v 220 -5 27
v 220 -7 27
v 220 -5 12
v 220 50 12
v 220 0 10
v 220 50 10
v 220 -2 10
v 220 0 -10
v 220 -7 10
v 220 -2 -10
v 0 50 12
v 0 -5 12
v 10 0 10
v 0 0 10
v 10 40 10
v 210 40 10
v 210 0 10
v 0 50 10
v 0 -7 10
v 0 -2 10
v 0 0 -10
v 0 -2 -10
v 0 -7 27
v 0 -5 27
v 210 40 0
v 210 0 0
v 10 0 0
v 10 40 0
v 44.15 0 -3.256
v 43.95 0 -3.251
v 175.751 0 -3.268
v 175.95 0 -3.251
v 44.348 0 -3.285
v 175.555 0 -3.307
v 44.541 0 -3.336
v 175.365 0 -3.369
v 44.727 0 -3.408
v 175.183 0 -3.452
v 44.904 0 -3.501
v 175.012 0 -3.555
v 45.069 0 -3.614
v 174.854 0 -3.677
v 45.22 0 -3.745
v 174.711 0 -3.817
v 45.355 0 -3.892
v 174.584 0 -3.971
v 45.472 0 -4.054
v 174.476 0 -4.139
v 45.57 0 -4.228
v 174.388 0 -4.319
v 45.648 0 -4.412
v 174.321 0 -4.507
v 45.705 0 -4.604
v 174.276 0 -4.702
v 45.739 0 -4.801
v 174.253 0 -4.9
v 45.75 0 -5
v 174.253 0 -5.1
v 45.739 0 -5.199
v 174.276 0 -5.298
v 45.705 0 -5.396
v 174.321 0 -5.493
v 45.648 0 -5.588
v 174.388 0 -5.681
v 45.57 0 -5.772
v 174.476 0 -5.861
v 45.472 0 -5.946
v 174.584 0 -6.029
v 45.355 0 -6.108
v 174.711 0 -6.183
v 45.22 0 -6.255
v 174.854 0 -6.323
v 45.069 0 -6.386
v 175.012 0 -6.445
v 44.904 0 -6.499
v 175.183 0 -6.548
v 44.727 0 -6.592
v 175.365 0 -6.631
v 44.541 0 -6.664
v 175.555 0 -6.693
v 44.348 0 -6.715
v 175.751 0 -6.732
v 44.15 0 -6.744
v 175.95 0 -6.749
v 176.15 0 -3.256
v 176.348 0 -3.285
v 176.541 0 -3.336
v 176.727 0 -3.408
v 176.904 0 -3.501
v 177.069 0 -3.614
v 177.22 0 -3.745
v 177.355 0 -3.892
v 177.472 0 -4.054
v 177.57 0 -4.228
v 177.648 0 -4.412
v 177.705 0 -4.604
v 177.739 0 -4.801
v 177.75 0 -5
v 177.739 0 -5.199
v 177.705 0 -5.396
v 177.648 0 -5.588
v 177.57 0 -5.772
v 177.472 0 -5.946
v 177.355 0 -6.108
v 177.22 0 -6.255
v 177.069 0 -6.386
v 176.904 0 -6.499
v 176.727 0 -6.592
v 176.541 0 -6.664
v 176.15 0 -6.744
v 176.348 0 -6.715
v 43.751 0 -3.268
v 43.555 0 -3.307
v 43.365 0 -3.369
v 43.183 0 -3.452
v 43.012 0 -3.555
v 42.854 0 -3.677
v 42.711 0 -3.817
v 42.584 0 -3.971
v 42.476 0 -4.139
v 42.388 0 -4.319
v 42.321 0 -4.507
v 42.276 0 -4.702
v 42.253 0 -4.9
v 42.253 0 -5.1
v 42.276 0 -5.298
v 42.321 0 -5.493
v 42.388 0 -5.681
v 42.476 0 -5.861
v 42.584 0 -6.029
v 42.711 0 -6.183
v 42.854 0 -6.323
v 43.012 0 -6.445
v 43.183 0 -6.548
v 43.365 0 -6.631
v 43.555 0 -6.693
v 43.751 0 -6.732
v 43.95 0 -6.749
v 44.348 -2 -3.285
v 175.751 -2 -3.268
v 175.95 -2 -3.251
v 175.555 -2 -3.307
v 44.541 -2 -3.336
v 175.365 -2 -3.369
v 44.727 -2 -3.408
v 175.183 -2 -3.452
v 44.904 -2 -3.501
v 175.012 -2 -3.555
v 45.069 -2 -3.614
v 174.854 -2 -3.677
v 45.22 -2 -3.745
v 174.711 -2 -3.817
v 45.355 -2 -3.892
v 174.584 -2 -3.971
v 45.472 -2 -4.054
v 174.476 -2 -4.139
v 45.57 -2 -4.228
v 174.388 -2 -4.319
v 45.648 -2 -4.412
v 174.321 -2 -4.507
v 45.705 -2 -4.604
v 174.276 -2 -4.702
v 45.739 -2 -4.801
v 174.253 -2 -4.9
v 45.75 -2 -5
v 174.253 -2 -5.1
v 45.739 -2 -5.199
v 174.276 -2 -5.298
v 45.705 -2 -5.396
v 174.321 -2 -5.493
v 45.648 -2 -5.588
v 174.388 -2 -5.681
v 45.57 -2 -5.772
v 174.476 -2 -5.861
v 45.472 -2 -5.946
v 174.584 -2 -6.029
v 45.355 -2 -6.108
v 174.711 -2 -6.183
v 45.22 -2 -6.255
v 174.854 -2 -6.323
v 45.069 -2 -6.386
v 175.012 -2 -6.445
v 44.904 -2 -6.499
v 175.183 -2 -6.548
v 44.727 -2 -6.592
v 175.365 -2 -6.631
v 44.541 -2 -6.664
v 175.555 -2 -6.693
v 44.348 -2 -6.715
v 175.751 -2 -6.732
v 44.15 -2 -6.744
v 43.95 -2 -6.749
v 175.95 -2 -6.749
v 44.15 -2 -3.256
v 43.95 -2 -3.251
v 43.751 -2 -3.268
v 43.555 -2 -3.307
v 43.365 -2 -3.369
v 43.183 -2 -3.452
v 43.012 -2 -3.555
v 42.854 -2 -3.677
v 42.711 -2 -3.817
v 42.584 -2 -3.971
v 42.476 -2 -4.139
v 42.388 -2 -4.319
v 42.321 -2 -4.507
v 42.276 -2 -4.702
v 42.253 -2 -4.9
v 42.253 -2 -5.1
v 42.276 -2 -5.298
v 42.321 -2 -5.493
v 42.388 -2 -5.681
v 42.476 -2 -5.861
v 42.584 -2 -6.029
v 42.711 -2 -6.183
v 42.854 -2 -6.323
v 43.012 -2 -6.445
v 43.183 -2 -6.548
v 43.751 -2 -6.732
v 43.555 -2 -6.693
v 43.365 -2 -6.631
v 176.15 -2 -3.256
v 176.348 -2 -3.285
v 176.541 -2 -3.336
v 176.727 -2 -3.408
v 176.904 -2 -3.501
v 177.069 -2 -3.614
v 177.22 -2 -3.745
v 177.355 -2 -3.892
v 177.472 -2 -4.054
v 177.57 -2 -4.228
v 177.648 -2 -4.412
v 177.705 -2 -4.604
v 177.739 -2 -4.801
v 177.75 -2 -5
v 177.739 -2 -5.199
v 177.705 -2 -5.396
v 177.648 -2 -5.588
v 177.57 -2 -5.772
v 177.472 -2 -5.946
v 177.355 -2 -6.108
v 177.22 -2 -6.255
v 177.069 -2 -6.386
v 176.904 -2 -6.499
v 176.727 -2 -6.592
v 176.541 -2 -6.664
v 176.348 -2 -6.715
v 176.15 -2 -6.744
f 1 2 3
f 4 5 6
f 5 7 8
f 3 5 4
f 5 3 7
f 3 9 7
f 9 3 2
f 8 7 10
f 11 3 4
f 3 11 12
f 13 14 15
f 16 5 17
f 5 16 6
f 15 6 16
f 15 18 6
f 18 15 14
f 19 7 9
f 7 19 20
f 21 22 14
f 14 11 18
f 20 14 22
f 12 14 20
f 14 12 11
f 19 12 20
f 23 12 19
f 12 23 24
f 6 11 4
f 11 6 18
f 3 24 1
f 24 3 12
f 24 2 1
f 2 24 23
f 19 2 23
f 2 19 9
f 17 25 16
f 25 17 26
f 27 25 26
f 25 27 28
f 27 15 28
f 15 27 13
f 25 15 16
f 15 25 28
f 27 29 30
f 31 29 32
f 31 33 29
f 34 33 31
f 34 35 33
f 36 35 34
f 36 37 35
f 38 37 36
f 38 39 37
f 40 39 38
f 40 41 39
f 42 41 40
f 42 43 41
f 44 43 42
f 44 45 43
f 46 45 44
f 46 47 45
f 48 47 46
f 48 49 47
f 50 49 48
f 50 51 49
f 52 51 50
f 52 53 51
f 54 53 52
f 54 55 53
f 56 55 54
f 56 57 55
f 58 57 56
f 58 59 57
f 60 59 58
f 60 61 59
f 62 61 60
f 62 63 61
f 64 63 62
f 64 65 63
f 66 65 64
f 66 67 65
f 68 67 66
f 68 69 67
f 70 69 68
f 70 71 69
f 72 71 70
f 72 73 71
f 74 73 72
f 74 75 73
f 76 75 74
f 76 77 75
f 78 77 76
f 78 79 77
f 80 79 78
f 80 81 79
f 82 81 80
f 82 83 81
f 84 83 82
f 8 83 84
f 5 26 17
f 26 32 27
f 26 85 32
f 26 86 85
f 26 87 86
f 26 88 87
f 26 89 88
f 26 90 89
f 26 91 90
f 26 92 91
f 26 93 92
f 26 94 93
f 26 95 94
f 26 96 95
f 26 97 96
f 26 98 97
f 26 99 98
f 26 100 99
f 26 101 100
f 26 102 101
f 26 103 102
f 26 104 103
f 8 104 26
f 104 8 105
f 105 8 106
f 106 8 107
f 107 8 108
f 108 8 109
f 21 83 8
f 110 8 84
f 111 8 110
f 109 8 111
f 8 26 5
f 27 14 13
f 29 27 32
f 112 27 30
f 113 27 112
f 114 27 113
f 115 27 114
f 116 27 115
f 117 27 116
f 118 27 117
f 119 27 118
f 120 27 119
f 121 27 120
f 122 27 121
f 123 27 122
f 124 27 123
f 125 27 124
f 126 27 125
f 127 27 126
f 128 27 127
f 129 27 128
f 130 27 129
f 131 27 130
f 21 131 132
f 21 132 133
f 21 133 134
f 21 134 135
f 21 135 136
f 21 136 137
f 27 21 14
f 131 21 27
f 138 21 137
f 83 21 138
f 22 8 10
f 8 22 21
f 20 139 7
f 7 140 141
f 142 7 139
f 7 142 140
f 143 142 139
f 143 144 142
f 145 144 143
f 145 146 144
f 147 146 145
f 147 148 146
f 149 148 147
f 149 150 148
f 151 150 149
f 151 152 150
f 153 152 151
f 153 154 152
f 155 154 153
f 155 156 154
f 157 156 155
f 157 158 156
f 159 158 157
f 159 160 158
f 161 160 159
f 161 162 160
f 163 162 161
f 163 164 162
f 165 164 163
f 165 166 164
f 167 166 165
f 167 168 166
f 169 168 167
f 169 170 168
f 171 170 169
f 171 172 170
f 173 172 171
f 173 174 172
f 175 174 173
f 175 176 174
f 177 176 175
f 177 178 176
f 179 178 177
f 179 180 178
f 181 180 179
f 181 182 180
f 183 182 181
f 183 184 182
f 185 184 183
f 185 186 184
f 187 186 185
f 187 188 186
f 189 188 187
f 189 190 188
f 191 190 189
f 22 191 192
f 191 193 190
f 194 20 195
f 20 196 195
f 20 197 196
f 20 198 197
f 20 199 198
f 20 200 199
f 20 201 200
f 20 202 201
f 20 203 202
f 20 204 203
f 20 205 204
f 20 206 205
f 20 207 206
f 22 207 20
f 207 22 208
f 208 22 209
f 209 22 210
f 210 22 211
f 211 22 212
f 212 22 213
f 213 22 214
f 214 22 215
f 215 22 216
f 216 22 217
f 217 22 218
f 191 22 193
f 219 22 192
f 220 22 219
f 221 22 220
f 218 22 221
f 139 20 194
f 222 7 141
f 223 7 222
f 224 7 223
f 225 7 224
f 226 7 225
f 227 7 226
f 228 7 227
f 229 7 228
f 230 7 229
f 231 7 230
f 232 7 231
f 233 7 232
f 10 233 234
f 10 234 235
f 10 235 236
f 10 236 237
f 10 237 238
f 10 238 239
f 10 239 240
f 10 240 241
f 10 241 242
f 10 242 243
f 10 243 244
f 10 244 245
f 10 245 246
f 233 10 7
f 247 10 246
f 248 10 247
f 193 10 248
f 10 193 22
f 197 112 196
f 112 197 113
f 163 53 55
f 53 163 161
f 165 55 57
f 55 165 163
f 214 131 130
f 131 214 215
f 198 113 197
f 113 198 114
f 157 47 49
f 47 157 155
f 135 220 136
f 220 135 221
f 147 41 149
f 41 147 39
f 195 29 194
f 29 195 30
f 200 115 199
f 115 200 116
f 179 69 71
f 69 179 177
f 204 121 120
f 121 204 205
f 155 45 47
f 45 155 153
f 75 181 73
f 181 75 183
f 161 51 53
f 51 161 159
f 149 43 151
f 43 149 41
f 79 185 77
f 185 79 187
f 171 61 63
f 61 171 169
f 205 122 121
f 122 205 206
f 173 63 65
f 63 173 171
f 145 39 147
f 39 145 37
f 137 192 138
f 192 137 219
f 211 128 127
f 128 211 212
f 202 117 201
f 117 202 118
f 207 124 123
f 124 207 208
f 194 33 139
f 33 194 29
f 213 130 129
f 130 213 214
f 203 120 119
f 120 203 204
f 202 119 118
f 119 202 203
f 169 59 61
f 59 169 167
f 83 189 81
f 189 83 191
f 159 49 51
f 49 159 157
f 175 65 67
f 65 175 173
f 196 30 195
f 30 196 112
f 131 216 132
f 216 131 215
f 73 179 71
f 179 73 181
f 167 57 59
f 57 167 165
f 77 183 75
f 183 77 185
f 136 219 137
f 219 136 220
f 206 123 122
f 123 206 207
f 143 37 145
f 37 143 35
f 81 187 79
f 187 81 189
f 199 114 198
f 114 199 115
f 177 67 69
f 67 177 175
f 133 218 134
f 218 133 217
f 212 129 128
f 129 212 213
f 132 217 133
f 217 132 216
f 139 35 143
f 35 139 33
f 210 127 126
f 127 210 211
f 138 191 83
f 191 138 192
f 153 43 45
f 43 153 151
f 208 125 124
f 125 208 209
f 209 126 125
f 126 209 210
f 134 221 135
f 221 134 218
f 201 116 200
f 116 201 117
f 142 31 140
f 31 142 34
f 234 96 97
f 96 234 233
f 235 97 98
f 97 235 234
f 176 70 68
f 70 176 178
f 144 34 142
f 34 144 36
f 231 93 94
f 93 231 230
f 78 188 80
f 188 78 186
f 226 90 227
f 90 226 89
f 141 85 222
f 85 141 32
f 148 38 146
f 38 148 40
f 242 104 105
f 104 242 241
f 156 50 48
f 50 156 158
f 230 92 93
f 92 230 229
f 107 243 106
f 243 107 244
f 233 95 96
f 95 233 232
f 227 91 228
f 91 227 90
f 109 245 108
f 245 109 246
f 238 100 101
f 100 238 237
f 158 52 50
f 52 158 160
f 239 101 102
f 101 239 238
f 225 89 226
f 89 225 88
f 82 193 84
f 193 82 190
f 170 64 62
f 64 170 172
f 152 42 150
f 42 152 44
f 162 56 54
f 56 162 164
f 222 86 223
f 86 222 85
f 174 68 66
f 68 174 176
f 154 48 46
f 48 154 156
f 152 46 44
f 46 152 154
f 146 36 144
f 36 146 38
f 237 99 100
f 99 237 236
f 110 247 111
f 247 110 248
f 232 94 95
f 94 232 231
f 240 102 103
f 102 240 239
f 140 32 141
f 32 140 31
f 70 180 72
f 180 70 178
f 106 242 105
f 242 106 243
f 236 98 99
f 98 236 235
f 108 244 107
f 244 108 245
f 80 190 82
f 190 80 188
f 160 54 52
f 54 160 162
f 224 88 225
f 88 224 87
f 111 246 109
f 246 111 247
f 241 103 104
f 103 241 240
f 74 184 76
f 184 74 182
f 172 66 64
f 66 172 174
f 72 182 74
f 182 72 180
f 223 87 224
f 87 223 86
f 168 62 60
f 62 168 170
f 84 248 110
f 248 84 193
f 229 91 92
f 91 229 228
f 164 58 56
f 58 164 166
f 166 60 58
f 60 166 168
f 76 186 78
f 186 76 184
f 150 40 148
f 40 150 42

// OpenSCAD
inner_depth=50;
outer_depth=5;
thickness=2;
bottom_height=10;
top_height=15;
hole=3.5;
width=220;

$fa=1;
$fs=.2;

difference() {
	union() {
		translate([0, 0, 10]) union() {
			translate([0, -outer_depth, 0]) cube([width, inner_depth+outer_depth, thickness]);
			translate([0, -outer_depth-thickness, 0]) cube([width, thickness, top_height+thickness]);
		}
		translate([10, 0, 0]) cube([width-20, inner_depth-10, 10]);
		translate([0, -thickness, -bottom_height]) cube([width, thickness, bottom_height+10]);
	}
	translate([width/5, 0, -bottom_height/2]) rotate([90, 0, 0]) cylinder(d=hole, h=4*thickness, center=true);
	translate([4*width/5, 0, -bottom_height/2]) rotate([90, 0, 0]) cylinder(d=hole, h=4*thickness, center=true);
}
